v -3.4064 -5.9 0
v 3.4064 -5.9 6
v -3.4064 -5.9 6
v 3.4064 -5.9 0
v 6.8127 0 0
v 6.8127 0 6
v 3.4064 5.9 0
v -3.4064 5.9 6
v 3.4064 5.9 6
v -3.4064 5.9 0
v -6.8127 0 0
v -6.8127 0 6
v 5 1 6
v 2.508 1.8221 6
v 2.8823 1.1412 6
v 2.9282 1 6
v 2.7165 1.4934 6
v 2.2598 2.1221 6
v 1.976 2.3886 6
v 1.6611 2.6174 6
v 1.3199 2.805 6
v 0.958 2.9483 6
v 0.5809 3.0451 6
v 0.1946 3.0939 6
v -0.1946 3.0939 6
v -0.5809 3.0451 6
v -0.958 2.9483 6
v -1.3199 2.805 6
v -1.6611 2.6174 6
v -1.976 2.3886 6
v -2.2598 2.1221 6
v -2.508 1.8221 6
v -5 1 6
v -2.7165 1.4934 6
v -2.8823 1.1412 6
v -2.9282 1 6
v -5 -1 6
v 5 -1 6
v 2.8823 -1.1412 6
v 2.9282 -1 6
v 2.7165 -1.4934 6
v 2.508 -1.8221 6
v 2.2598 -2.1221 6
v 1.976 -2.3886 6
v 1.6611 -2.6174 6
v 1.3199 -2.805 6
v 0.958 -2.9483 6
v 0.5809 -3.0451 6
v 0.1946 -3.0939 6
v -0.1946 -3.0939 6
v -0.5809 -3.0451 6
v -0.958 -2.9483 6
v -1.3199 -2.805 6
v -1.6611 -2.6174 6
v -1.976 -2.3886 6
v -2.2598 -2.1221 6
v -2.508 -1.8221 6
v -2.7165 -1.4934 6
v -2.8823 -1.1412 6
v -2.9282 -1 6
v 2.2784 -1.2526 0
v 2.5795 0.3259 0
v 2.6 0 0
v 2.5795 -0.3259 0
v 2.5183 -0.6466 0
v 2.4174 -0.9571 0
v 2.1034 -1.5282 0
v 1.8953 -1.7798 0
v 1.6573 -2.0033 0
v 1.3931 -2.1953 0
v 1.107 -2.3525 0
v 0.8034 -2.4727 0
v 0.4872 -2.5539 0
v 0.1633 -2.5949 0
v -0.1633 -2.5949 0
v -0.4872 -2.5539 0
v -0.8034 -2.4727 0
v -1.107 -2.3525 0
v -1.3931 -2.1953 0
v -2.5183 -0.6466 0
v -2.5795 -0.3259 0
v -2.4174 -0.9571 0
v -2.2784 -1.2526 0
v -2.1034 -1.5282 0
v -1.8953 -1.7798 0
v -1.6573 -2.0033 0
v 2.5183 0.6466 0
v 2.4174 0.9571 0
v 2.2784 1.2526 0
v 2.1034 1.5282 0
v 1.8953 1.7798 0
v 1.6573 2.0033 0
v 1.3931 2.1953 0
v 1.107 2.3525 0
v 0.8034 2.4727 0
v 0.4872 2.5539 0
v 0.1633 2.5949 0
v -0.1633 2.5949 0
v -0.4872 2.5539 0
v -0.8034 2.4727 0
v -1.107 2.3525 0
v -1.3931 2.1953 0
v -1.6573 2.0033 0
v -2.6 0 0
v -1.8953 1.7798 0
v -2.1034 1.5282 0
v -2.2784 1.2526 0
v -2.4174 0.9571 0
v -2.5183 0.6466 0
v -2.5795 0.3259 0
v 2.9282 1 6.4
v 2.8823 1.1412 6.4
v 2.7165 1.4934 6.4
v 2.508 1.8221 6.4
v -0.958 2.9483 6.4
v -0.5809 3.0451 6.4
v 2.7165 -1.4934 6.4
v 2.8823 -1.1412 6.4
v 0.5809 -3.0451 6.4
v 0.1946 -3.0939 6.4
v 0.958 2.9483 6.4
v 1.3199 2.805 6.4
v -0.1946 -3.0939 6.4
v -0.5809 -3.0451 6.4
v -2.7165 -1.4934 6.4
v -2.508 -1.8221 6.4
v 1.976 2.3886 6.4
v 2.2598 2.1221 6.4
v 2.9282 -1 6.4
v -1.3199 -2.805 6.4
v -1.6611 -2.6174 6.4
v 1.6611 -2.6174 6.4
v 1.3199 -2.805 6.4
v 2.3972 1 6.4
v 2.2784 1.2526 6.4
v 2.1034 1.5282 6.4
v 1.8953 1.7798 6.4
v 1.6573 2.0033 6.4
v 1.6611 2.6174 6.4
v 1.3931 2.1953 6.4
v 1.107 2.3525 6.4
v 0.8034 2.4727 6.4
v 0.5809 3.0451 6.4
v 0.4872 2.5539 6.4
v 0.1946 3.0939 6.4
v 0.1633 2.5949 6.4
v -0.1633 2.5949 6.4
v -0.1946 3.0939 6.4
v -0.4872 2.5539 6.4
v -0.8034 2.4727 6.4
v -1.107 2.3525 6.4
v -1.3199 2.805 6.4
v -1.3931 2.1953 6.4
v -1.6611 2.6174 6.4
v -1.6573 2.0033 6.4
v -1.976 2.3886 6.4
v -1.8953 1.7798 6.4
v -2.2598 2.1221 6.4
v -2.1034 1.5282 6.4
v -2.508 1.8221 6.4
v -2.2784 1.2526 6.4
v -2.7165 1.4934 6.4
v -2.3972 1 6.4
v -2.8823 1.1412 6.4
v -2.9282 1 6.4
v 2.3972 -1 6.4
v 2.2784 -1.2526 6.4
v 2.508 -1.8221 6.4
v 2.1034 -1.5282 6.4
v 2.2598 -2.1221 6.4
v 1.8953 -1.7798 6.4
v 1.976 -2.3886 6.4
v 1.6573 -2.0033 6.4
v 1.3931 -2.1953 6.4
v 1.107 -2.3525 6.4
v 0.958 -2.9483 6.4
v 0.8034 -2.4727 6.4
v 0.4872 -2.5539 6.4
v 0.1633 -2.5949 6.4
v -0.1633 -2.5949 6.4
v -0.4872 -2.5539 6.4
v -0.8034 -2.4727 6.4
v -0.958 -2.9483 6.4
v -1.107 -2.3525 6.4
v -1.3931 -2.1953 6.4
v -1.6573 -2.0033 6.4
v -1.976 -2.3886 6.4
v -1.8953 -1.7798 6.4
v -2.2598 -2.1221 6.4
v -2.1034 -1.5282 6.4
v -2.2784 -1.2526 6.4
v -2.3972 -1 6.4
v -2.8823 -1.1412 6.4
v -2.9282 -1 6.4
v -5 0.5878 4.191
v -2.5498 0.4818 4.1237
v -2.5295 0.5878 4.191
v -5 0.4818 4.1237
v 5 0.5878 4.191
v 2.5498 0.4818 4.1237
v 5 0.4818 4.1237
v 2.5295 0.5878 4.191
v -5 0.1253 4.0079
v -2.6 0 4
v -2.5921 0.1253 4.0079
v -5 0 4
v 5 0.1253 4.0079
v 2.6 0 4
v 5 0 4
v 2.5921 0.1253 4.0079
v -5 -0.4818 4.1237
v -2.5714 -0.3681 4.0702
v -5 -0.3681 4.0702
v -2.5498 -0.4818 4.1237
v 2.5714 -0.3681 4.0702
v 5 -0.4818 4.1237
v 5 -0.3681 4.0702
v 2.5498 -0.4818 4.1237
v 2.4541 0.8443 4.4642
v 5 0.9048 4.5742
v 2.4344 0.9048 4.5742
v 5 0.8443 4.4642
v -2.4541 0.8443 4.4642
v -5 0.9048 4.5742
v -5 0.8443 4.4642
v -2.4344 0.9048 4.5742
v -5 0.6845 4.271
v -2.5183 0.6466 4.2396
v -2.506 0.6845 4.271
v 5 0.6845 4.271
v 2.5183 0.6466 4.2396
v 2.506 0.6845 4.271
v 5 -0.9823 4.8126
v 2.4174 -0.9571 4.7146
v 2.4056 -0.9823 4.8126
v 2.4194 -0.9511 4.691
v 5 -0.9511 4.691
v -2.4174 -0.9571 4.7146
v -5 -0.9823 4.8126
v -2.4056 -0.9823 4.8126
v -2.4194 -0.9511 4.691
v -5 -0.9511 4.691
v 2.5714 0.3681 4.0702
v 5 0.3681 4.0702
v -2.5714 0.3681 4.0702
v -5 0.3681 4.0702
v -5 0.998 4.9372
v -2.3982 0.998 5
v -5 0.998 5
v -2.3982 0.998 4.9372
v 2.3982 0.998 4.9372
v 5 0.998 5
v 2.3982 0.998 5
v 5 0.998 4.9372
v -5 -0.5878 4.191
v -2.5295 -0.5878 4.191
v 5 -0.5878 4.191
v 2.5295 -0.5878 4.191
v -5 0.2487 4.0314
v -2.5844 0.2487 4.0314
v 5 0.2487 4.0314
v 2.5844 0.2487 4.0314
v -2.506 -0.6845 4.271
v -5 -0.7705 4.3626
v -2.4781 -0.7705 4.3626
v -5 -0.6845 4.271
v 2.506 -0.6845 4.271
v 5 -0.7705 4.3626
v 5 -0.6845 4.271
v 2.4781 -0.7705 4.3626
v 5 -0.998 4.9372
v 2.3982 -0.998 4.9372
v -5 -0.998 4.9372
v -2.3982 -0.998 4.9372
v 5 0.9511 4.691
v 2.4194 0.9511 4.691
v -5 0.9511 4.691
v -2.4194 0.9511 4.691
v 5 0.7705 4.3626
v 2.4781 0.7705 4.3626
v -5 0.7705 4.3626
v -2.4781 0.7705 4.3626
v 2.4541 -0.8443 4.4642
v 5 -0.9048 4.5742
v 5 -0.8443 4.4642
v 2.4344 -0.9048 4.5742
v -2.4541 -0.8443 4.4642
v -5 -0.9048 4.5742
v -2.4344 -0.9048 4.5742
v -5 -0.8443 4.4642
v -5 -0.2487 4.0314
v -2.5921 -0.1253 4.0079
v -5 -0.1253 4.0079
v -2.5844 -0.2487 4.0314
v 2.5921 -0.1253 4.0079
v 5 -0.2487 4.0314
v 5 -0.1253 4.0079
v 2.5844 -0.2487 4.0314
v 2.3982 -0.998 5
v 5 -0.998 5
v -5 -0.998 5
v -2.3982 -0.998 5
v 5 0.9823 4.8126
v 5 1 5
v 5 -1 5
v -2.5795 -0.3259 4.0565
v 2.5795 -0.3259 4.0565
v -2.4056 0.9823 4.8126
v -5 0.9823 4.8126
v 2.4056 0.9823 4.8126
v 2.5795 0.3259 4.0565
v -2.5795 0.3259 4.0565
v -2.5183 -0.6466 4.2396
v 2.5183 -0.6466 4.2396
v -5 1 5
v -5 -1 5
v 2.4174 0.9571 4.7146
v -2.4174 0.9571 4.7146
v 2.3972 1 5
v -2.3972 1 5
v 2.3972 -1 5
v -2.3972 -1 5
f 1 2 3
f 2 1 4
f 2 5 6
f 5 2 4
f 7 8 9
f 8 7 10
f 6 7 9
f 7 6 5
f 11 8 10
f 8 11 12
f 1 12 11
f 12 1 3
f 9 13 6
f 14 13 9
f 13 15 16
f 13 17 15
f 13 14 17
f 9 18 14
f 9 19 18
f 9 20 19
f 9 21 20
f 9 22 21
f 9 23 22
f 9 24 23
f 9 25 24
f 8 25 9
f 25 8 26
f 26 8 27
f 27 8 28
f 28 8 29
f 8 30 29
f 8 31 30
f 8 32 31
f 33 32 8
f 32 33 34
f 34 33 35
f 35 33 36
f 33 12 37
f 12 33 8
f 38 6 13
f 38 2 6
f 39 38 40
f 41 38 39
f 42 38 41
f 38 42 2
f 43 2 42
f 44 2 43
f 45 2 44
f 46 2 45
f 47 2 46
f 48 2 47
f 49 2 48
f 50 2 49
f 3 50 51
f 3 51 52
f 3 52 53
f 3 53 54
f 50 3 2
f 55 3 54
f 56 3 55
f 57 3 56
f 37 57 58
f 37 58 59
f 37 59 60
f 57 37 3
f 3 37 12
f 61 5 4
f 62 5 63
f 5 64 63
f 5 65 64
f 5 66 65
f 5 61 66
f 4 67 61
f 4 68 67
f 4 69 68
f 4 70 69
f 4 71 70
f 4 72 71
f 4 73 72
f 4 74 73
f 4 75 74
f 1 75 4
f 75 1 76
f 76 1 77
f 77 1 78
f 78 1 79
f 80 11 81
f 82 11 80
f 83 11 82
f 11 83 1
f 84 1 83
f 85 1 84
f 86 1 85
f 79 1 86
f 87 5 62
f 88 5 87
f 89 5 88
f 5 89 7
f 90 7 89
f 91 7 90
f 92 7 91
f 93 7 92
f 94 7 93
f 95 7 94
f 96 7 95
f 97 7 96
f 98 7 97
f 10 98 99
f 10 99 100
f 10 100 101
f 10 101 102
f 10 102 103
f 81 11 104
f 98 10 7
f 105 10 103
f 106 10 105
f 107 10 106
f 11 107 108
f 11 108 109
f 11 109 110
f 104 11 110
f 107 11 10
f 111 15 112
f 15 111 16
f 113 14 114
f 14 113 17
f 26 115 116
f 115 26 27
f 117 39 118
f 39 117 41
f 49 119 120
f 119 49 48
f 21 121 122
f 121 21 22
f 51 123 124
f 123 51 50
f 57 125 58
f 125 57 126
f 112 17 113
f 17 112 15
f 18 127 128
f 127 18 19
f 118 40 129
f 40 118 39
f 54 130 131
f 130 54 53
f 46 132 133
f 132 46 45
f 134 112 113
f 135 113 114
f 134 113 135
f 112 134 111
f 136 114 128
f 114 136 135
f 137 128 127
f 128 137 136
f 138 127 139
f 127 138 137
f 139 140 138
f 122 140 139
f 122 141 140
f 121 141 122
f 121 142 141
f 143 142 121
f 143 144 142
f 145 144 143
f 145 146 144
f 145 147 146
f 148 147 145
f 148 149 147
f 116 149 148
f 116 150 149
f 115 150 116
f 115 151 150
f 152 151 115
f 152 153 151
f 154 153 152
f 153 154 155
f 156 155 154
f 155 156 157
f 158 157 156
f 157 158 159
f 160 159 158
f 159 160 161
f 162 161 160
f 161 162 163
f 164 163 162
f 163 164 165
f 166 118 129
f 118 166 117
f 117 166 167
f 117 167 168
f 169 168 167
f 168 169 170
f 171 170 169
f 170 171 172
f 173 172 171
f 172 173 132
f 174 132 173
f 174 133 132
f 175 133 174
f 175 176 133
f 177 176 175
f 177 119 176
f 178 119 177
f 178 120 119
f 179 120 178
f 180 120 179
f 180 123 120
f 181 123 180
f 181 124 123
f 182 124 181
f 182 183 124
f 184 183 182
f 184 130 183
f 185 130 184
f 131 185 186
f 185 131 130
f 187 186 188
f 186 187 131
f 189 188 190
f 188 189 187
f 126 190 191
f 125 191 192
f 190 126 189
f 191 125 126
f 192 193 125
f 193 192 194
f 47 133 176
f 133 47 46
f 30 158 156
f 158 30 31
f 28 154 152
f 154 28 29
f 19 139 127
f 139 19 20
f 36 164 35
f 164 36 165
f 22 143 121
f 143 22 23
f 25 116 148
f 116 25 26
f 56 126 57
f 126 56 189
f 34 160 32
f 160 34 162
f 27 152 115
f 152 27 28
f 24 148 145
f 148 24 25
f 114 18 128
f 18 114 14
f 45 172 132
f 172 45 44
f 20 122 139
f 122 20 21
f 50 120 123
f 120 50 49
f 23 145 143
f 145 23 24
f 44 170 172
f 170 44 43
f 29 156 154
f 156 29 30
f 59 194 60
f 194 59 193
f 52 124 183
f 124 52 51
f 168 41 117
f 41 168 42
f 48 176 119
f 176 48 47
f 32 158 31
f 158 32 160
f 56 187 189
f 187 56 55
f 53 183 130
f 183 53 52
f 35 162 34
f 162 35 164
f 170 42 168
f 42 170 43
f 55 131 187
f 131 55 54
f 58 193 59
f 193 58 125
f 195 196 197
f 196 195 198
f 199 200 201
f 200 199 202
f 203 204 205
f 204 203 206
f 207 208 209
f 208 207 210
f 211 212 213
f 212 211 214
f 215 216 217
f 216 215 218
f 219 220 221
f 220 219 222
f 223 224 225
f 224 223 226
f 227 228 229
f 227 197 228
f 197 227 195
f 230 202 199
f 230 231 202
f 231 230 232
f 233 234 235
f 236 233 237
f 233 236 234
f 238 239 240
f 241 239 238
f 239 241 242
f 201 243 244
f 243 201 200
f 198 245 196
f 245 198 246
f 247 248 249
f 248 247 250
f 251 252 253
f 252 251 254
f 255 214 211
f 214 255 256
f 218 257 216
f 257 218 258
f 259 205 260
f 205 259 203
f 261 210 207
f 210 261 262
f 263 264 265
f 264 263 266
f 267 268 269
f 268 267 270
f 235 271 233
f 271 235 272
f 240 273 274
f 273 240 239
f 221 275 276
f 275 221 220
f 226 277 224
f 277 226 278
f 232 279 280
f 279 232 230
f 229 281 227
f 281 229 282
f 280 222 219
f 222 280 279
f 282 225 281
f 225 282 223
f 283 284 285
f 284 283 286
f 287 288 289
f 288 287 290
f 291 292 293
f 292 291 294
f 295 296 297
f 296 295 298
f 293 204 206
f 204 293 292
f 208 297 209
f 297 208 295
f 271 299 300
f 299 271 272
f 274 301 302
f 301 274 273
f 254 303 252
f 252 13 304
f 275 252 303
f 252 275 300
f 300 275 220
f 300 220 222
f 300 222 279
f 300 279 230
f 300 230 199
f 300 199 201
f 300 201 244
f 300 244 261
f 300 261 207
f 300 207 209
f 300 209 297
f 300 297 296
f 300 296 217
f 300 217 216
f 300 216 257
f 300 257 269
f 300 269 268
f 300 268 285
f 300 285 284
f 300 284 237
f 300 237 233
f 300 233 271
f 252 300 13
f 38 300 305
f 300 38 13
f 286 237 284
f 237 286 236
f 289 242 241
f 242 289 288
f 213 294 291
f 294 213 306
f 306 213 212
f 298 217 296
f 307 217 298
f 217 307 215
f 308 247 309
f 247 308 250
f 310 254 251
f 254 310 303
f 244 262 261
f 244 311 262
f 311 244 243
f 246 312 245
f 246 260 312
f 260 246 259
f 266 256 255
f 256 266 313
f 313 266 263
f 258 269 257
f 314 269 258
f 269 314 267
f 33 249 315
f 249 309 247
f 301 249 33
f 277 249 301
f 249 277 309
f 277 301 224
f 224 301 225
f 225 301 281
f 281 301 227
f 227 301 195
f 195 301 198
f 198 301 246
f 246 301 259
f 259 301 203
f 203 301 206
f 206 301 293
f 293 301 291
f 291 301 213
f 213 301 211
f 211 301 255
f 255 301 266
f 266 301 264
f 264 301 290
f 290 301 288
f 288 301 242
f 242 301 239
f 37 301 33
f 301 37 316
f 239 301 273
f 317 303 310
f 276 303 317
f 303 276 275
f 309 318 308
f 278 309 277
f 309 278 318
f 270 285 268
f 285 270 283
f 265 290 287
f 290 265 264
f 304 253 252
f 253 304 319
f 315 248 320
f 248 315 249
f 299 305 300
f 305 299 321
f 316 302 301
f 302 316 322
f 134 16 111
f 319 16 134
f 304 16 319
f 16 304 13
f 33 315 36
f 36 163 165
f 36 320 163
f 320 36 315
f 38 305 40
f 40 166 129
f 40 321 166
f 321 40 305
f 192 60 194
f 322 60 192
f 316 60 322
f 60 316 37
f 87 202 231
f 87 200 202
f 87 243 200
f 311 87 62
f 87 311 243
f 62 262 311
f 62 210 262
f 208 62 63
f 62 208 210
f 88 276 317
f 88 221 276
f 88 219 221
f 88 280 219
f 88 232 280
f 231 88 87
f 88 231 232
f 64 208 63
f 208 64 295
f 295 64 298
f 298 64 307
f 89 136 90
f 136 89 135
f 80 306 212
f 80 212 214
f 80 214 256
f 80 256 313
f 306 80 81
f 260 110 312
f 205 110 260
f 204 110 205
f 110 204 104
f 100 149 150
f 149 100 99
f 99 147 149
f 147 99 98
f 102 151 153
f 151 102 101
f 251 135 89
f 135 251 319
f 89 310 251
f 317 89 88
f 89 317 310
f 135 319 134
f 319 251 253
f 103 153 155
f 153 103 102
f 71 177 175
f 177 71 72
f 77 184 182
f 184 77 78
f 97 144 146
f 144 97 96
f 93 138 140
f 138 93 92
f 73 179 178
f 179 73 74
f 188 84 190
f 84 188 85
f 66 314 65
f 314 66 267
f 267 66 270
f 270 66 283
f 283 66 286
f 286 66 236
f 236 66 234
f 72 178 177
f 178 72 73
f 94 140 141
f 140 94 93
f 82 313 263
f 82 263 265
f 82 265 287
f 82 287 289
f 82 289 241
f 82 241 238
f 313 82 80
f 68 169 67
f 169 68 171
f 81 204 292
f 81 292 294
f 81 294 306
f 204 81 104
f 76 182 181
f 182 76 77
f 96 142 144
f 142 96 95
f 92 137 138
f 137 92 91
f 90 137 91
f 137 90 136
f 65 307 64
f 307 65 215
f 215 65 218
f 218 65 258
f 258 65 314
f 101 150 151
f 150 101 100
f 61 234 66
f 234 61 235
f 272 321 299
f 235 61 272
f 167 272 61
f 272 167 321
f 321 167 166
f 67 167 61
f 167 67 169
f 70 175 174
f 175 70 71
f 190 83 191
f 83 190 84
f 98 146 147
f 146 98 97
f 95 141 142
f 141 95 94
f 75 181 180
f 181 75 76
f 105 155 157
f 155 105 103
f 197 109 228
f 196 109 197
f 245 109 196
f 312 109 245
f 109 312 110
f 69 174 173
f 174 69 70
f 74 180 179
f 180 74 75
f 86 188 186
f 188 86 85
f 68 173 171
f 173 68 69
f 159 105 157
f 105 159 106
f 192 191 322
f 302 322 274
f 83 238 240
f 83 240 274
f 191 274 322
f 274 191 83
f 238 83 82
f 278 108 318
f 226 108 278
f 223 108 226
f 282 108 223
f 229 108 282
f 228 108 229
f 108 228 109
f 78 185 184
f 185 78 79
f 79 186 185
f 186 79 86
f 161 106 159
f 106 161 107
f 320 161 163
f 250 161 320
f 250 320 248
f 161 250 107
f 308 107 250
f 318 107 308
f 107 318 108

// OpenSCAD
//height in mm
hexHeight = 6.0;
// depending on your printer you will need some tolerance
hexSize = 11.8;

 // axle diameter
axleDiameter = 5.2;

// pin diameter
pinDiameter = 2;
// pin height
pinLength = 10.0;
// how deep the pin goes
pinDepth = 2;

// offset size, preferably bearing inner ring size
offsetDiameter = 6.2;
// bearing offset in mm, set to 0 for no offset
offsetHeight = 0.4;

/* [Hidden] */

// global curve detail
$fn=50; 

 module cylinder_outer(height,radius,fn){
   fudge = 1/cos(180/fn);
   cylinder(h=height,r=radius*fudge,$fn=fn);}
   
   

difference(){
    union(){   
        cylinder_outer(hexHeight, hexSize/2, 6);
        cylinder(hexHeight + offsetHeight, d = offsetDiameter);
    }
    translate(v=[0,0,-1]){
        cylinder(hexHeight + offsetHeight + 2, d = axleDiameter);
    }
    translate(v=[0,0, hexHeight - pinDepth + pinDiameter/2]){
        union(){
            translate(v=[-pinLength/2,0,0]){
                rotate(a=[0,90,0]){   
                    cylinder(pinLength, d = pinDiameter);
                }
            }
            translate(v=[0,0, (pinDiameter + pinDepth + offsetHeight)/2]){
                cube([pinLength, pinDiameter, pinDiameter + pinDepth + offsetHeight], center=true);
            }
        }
    }
}


   
